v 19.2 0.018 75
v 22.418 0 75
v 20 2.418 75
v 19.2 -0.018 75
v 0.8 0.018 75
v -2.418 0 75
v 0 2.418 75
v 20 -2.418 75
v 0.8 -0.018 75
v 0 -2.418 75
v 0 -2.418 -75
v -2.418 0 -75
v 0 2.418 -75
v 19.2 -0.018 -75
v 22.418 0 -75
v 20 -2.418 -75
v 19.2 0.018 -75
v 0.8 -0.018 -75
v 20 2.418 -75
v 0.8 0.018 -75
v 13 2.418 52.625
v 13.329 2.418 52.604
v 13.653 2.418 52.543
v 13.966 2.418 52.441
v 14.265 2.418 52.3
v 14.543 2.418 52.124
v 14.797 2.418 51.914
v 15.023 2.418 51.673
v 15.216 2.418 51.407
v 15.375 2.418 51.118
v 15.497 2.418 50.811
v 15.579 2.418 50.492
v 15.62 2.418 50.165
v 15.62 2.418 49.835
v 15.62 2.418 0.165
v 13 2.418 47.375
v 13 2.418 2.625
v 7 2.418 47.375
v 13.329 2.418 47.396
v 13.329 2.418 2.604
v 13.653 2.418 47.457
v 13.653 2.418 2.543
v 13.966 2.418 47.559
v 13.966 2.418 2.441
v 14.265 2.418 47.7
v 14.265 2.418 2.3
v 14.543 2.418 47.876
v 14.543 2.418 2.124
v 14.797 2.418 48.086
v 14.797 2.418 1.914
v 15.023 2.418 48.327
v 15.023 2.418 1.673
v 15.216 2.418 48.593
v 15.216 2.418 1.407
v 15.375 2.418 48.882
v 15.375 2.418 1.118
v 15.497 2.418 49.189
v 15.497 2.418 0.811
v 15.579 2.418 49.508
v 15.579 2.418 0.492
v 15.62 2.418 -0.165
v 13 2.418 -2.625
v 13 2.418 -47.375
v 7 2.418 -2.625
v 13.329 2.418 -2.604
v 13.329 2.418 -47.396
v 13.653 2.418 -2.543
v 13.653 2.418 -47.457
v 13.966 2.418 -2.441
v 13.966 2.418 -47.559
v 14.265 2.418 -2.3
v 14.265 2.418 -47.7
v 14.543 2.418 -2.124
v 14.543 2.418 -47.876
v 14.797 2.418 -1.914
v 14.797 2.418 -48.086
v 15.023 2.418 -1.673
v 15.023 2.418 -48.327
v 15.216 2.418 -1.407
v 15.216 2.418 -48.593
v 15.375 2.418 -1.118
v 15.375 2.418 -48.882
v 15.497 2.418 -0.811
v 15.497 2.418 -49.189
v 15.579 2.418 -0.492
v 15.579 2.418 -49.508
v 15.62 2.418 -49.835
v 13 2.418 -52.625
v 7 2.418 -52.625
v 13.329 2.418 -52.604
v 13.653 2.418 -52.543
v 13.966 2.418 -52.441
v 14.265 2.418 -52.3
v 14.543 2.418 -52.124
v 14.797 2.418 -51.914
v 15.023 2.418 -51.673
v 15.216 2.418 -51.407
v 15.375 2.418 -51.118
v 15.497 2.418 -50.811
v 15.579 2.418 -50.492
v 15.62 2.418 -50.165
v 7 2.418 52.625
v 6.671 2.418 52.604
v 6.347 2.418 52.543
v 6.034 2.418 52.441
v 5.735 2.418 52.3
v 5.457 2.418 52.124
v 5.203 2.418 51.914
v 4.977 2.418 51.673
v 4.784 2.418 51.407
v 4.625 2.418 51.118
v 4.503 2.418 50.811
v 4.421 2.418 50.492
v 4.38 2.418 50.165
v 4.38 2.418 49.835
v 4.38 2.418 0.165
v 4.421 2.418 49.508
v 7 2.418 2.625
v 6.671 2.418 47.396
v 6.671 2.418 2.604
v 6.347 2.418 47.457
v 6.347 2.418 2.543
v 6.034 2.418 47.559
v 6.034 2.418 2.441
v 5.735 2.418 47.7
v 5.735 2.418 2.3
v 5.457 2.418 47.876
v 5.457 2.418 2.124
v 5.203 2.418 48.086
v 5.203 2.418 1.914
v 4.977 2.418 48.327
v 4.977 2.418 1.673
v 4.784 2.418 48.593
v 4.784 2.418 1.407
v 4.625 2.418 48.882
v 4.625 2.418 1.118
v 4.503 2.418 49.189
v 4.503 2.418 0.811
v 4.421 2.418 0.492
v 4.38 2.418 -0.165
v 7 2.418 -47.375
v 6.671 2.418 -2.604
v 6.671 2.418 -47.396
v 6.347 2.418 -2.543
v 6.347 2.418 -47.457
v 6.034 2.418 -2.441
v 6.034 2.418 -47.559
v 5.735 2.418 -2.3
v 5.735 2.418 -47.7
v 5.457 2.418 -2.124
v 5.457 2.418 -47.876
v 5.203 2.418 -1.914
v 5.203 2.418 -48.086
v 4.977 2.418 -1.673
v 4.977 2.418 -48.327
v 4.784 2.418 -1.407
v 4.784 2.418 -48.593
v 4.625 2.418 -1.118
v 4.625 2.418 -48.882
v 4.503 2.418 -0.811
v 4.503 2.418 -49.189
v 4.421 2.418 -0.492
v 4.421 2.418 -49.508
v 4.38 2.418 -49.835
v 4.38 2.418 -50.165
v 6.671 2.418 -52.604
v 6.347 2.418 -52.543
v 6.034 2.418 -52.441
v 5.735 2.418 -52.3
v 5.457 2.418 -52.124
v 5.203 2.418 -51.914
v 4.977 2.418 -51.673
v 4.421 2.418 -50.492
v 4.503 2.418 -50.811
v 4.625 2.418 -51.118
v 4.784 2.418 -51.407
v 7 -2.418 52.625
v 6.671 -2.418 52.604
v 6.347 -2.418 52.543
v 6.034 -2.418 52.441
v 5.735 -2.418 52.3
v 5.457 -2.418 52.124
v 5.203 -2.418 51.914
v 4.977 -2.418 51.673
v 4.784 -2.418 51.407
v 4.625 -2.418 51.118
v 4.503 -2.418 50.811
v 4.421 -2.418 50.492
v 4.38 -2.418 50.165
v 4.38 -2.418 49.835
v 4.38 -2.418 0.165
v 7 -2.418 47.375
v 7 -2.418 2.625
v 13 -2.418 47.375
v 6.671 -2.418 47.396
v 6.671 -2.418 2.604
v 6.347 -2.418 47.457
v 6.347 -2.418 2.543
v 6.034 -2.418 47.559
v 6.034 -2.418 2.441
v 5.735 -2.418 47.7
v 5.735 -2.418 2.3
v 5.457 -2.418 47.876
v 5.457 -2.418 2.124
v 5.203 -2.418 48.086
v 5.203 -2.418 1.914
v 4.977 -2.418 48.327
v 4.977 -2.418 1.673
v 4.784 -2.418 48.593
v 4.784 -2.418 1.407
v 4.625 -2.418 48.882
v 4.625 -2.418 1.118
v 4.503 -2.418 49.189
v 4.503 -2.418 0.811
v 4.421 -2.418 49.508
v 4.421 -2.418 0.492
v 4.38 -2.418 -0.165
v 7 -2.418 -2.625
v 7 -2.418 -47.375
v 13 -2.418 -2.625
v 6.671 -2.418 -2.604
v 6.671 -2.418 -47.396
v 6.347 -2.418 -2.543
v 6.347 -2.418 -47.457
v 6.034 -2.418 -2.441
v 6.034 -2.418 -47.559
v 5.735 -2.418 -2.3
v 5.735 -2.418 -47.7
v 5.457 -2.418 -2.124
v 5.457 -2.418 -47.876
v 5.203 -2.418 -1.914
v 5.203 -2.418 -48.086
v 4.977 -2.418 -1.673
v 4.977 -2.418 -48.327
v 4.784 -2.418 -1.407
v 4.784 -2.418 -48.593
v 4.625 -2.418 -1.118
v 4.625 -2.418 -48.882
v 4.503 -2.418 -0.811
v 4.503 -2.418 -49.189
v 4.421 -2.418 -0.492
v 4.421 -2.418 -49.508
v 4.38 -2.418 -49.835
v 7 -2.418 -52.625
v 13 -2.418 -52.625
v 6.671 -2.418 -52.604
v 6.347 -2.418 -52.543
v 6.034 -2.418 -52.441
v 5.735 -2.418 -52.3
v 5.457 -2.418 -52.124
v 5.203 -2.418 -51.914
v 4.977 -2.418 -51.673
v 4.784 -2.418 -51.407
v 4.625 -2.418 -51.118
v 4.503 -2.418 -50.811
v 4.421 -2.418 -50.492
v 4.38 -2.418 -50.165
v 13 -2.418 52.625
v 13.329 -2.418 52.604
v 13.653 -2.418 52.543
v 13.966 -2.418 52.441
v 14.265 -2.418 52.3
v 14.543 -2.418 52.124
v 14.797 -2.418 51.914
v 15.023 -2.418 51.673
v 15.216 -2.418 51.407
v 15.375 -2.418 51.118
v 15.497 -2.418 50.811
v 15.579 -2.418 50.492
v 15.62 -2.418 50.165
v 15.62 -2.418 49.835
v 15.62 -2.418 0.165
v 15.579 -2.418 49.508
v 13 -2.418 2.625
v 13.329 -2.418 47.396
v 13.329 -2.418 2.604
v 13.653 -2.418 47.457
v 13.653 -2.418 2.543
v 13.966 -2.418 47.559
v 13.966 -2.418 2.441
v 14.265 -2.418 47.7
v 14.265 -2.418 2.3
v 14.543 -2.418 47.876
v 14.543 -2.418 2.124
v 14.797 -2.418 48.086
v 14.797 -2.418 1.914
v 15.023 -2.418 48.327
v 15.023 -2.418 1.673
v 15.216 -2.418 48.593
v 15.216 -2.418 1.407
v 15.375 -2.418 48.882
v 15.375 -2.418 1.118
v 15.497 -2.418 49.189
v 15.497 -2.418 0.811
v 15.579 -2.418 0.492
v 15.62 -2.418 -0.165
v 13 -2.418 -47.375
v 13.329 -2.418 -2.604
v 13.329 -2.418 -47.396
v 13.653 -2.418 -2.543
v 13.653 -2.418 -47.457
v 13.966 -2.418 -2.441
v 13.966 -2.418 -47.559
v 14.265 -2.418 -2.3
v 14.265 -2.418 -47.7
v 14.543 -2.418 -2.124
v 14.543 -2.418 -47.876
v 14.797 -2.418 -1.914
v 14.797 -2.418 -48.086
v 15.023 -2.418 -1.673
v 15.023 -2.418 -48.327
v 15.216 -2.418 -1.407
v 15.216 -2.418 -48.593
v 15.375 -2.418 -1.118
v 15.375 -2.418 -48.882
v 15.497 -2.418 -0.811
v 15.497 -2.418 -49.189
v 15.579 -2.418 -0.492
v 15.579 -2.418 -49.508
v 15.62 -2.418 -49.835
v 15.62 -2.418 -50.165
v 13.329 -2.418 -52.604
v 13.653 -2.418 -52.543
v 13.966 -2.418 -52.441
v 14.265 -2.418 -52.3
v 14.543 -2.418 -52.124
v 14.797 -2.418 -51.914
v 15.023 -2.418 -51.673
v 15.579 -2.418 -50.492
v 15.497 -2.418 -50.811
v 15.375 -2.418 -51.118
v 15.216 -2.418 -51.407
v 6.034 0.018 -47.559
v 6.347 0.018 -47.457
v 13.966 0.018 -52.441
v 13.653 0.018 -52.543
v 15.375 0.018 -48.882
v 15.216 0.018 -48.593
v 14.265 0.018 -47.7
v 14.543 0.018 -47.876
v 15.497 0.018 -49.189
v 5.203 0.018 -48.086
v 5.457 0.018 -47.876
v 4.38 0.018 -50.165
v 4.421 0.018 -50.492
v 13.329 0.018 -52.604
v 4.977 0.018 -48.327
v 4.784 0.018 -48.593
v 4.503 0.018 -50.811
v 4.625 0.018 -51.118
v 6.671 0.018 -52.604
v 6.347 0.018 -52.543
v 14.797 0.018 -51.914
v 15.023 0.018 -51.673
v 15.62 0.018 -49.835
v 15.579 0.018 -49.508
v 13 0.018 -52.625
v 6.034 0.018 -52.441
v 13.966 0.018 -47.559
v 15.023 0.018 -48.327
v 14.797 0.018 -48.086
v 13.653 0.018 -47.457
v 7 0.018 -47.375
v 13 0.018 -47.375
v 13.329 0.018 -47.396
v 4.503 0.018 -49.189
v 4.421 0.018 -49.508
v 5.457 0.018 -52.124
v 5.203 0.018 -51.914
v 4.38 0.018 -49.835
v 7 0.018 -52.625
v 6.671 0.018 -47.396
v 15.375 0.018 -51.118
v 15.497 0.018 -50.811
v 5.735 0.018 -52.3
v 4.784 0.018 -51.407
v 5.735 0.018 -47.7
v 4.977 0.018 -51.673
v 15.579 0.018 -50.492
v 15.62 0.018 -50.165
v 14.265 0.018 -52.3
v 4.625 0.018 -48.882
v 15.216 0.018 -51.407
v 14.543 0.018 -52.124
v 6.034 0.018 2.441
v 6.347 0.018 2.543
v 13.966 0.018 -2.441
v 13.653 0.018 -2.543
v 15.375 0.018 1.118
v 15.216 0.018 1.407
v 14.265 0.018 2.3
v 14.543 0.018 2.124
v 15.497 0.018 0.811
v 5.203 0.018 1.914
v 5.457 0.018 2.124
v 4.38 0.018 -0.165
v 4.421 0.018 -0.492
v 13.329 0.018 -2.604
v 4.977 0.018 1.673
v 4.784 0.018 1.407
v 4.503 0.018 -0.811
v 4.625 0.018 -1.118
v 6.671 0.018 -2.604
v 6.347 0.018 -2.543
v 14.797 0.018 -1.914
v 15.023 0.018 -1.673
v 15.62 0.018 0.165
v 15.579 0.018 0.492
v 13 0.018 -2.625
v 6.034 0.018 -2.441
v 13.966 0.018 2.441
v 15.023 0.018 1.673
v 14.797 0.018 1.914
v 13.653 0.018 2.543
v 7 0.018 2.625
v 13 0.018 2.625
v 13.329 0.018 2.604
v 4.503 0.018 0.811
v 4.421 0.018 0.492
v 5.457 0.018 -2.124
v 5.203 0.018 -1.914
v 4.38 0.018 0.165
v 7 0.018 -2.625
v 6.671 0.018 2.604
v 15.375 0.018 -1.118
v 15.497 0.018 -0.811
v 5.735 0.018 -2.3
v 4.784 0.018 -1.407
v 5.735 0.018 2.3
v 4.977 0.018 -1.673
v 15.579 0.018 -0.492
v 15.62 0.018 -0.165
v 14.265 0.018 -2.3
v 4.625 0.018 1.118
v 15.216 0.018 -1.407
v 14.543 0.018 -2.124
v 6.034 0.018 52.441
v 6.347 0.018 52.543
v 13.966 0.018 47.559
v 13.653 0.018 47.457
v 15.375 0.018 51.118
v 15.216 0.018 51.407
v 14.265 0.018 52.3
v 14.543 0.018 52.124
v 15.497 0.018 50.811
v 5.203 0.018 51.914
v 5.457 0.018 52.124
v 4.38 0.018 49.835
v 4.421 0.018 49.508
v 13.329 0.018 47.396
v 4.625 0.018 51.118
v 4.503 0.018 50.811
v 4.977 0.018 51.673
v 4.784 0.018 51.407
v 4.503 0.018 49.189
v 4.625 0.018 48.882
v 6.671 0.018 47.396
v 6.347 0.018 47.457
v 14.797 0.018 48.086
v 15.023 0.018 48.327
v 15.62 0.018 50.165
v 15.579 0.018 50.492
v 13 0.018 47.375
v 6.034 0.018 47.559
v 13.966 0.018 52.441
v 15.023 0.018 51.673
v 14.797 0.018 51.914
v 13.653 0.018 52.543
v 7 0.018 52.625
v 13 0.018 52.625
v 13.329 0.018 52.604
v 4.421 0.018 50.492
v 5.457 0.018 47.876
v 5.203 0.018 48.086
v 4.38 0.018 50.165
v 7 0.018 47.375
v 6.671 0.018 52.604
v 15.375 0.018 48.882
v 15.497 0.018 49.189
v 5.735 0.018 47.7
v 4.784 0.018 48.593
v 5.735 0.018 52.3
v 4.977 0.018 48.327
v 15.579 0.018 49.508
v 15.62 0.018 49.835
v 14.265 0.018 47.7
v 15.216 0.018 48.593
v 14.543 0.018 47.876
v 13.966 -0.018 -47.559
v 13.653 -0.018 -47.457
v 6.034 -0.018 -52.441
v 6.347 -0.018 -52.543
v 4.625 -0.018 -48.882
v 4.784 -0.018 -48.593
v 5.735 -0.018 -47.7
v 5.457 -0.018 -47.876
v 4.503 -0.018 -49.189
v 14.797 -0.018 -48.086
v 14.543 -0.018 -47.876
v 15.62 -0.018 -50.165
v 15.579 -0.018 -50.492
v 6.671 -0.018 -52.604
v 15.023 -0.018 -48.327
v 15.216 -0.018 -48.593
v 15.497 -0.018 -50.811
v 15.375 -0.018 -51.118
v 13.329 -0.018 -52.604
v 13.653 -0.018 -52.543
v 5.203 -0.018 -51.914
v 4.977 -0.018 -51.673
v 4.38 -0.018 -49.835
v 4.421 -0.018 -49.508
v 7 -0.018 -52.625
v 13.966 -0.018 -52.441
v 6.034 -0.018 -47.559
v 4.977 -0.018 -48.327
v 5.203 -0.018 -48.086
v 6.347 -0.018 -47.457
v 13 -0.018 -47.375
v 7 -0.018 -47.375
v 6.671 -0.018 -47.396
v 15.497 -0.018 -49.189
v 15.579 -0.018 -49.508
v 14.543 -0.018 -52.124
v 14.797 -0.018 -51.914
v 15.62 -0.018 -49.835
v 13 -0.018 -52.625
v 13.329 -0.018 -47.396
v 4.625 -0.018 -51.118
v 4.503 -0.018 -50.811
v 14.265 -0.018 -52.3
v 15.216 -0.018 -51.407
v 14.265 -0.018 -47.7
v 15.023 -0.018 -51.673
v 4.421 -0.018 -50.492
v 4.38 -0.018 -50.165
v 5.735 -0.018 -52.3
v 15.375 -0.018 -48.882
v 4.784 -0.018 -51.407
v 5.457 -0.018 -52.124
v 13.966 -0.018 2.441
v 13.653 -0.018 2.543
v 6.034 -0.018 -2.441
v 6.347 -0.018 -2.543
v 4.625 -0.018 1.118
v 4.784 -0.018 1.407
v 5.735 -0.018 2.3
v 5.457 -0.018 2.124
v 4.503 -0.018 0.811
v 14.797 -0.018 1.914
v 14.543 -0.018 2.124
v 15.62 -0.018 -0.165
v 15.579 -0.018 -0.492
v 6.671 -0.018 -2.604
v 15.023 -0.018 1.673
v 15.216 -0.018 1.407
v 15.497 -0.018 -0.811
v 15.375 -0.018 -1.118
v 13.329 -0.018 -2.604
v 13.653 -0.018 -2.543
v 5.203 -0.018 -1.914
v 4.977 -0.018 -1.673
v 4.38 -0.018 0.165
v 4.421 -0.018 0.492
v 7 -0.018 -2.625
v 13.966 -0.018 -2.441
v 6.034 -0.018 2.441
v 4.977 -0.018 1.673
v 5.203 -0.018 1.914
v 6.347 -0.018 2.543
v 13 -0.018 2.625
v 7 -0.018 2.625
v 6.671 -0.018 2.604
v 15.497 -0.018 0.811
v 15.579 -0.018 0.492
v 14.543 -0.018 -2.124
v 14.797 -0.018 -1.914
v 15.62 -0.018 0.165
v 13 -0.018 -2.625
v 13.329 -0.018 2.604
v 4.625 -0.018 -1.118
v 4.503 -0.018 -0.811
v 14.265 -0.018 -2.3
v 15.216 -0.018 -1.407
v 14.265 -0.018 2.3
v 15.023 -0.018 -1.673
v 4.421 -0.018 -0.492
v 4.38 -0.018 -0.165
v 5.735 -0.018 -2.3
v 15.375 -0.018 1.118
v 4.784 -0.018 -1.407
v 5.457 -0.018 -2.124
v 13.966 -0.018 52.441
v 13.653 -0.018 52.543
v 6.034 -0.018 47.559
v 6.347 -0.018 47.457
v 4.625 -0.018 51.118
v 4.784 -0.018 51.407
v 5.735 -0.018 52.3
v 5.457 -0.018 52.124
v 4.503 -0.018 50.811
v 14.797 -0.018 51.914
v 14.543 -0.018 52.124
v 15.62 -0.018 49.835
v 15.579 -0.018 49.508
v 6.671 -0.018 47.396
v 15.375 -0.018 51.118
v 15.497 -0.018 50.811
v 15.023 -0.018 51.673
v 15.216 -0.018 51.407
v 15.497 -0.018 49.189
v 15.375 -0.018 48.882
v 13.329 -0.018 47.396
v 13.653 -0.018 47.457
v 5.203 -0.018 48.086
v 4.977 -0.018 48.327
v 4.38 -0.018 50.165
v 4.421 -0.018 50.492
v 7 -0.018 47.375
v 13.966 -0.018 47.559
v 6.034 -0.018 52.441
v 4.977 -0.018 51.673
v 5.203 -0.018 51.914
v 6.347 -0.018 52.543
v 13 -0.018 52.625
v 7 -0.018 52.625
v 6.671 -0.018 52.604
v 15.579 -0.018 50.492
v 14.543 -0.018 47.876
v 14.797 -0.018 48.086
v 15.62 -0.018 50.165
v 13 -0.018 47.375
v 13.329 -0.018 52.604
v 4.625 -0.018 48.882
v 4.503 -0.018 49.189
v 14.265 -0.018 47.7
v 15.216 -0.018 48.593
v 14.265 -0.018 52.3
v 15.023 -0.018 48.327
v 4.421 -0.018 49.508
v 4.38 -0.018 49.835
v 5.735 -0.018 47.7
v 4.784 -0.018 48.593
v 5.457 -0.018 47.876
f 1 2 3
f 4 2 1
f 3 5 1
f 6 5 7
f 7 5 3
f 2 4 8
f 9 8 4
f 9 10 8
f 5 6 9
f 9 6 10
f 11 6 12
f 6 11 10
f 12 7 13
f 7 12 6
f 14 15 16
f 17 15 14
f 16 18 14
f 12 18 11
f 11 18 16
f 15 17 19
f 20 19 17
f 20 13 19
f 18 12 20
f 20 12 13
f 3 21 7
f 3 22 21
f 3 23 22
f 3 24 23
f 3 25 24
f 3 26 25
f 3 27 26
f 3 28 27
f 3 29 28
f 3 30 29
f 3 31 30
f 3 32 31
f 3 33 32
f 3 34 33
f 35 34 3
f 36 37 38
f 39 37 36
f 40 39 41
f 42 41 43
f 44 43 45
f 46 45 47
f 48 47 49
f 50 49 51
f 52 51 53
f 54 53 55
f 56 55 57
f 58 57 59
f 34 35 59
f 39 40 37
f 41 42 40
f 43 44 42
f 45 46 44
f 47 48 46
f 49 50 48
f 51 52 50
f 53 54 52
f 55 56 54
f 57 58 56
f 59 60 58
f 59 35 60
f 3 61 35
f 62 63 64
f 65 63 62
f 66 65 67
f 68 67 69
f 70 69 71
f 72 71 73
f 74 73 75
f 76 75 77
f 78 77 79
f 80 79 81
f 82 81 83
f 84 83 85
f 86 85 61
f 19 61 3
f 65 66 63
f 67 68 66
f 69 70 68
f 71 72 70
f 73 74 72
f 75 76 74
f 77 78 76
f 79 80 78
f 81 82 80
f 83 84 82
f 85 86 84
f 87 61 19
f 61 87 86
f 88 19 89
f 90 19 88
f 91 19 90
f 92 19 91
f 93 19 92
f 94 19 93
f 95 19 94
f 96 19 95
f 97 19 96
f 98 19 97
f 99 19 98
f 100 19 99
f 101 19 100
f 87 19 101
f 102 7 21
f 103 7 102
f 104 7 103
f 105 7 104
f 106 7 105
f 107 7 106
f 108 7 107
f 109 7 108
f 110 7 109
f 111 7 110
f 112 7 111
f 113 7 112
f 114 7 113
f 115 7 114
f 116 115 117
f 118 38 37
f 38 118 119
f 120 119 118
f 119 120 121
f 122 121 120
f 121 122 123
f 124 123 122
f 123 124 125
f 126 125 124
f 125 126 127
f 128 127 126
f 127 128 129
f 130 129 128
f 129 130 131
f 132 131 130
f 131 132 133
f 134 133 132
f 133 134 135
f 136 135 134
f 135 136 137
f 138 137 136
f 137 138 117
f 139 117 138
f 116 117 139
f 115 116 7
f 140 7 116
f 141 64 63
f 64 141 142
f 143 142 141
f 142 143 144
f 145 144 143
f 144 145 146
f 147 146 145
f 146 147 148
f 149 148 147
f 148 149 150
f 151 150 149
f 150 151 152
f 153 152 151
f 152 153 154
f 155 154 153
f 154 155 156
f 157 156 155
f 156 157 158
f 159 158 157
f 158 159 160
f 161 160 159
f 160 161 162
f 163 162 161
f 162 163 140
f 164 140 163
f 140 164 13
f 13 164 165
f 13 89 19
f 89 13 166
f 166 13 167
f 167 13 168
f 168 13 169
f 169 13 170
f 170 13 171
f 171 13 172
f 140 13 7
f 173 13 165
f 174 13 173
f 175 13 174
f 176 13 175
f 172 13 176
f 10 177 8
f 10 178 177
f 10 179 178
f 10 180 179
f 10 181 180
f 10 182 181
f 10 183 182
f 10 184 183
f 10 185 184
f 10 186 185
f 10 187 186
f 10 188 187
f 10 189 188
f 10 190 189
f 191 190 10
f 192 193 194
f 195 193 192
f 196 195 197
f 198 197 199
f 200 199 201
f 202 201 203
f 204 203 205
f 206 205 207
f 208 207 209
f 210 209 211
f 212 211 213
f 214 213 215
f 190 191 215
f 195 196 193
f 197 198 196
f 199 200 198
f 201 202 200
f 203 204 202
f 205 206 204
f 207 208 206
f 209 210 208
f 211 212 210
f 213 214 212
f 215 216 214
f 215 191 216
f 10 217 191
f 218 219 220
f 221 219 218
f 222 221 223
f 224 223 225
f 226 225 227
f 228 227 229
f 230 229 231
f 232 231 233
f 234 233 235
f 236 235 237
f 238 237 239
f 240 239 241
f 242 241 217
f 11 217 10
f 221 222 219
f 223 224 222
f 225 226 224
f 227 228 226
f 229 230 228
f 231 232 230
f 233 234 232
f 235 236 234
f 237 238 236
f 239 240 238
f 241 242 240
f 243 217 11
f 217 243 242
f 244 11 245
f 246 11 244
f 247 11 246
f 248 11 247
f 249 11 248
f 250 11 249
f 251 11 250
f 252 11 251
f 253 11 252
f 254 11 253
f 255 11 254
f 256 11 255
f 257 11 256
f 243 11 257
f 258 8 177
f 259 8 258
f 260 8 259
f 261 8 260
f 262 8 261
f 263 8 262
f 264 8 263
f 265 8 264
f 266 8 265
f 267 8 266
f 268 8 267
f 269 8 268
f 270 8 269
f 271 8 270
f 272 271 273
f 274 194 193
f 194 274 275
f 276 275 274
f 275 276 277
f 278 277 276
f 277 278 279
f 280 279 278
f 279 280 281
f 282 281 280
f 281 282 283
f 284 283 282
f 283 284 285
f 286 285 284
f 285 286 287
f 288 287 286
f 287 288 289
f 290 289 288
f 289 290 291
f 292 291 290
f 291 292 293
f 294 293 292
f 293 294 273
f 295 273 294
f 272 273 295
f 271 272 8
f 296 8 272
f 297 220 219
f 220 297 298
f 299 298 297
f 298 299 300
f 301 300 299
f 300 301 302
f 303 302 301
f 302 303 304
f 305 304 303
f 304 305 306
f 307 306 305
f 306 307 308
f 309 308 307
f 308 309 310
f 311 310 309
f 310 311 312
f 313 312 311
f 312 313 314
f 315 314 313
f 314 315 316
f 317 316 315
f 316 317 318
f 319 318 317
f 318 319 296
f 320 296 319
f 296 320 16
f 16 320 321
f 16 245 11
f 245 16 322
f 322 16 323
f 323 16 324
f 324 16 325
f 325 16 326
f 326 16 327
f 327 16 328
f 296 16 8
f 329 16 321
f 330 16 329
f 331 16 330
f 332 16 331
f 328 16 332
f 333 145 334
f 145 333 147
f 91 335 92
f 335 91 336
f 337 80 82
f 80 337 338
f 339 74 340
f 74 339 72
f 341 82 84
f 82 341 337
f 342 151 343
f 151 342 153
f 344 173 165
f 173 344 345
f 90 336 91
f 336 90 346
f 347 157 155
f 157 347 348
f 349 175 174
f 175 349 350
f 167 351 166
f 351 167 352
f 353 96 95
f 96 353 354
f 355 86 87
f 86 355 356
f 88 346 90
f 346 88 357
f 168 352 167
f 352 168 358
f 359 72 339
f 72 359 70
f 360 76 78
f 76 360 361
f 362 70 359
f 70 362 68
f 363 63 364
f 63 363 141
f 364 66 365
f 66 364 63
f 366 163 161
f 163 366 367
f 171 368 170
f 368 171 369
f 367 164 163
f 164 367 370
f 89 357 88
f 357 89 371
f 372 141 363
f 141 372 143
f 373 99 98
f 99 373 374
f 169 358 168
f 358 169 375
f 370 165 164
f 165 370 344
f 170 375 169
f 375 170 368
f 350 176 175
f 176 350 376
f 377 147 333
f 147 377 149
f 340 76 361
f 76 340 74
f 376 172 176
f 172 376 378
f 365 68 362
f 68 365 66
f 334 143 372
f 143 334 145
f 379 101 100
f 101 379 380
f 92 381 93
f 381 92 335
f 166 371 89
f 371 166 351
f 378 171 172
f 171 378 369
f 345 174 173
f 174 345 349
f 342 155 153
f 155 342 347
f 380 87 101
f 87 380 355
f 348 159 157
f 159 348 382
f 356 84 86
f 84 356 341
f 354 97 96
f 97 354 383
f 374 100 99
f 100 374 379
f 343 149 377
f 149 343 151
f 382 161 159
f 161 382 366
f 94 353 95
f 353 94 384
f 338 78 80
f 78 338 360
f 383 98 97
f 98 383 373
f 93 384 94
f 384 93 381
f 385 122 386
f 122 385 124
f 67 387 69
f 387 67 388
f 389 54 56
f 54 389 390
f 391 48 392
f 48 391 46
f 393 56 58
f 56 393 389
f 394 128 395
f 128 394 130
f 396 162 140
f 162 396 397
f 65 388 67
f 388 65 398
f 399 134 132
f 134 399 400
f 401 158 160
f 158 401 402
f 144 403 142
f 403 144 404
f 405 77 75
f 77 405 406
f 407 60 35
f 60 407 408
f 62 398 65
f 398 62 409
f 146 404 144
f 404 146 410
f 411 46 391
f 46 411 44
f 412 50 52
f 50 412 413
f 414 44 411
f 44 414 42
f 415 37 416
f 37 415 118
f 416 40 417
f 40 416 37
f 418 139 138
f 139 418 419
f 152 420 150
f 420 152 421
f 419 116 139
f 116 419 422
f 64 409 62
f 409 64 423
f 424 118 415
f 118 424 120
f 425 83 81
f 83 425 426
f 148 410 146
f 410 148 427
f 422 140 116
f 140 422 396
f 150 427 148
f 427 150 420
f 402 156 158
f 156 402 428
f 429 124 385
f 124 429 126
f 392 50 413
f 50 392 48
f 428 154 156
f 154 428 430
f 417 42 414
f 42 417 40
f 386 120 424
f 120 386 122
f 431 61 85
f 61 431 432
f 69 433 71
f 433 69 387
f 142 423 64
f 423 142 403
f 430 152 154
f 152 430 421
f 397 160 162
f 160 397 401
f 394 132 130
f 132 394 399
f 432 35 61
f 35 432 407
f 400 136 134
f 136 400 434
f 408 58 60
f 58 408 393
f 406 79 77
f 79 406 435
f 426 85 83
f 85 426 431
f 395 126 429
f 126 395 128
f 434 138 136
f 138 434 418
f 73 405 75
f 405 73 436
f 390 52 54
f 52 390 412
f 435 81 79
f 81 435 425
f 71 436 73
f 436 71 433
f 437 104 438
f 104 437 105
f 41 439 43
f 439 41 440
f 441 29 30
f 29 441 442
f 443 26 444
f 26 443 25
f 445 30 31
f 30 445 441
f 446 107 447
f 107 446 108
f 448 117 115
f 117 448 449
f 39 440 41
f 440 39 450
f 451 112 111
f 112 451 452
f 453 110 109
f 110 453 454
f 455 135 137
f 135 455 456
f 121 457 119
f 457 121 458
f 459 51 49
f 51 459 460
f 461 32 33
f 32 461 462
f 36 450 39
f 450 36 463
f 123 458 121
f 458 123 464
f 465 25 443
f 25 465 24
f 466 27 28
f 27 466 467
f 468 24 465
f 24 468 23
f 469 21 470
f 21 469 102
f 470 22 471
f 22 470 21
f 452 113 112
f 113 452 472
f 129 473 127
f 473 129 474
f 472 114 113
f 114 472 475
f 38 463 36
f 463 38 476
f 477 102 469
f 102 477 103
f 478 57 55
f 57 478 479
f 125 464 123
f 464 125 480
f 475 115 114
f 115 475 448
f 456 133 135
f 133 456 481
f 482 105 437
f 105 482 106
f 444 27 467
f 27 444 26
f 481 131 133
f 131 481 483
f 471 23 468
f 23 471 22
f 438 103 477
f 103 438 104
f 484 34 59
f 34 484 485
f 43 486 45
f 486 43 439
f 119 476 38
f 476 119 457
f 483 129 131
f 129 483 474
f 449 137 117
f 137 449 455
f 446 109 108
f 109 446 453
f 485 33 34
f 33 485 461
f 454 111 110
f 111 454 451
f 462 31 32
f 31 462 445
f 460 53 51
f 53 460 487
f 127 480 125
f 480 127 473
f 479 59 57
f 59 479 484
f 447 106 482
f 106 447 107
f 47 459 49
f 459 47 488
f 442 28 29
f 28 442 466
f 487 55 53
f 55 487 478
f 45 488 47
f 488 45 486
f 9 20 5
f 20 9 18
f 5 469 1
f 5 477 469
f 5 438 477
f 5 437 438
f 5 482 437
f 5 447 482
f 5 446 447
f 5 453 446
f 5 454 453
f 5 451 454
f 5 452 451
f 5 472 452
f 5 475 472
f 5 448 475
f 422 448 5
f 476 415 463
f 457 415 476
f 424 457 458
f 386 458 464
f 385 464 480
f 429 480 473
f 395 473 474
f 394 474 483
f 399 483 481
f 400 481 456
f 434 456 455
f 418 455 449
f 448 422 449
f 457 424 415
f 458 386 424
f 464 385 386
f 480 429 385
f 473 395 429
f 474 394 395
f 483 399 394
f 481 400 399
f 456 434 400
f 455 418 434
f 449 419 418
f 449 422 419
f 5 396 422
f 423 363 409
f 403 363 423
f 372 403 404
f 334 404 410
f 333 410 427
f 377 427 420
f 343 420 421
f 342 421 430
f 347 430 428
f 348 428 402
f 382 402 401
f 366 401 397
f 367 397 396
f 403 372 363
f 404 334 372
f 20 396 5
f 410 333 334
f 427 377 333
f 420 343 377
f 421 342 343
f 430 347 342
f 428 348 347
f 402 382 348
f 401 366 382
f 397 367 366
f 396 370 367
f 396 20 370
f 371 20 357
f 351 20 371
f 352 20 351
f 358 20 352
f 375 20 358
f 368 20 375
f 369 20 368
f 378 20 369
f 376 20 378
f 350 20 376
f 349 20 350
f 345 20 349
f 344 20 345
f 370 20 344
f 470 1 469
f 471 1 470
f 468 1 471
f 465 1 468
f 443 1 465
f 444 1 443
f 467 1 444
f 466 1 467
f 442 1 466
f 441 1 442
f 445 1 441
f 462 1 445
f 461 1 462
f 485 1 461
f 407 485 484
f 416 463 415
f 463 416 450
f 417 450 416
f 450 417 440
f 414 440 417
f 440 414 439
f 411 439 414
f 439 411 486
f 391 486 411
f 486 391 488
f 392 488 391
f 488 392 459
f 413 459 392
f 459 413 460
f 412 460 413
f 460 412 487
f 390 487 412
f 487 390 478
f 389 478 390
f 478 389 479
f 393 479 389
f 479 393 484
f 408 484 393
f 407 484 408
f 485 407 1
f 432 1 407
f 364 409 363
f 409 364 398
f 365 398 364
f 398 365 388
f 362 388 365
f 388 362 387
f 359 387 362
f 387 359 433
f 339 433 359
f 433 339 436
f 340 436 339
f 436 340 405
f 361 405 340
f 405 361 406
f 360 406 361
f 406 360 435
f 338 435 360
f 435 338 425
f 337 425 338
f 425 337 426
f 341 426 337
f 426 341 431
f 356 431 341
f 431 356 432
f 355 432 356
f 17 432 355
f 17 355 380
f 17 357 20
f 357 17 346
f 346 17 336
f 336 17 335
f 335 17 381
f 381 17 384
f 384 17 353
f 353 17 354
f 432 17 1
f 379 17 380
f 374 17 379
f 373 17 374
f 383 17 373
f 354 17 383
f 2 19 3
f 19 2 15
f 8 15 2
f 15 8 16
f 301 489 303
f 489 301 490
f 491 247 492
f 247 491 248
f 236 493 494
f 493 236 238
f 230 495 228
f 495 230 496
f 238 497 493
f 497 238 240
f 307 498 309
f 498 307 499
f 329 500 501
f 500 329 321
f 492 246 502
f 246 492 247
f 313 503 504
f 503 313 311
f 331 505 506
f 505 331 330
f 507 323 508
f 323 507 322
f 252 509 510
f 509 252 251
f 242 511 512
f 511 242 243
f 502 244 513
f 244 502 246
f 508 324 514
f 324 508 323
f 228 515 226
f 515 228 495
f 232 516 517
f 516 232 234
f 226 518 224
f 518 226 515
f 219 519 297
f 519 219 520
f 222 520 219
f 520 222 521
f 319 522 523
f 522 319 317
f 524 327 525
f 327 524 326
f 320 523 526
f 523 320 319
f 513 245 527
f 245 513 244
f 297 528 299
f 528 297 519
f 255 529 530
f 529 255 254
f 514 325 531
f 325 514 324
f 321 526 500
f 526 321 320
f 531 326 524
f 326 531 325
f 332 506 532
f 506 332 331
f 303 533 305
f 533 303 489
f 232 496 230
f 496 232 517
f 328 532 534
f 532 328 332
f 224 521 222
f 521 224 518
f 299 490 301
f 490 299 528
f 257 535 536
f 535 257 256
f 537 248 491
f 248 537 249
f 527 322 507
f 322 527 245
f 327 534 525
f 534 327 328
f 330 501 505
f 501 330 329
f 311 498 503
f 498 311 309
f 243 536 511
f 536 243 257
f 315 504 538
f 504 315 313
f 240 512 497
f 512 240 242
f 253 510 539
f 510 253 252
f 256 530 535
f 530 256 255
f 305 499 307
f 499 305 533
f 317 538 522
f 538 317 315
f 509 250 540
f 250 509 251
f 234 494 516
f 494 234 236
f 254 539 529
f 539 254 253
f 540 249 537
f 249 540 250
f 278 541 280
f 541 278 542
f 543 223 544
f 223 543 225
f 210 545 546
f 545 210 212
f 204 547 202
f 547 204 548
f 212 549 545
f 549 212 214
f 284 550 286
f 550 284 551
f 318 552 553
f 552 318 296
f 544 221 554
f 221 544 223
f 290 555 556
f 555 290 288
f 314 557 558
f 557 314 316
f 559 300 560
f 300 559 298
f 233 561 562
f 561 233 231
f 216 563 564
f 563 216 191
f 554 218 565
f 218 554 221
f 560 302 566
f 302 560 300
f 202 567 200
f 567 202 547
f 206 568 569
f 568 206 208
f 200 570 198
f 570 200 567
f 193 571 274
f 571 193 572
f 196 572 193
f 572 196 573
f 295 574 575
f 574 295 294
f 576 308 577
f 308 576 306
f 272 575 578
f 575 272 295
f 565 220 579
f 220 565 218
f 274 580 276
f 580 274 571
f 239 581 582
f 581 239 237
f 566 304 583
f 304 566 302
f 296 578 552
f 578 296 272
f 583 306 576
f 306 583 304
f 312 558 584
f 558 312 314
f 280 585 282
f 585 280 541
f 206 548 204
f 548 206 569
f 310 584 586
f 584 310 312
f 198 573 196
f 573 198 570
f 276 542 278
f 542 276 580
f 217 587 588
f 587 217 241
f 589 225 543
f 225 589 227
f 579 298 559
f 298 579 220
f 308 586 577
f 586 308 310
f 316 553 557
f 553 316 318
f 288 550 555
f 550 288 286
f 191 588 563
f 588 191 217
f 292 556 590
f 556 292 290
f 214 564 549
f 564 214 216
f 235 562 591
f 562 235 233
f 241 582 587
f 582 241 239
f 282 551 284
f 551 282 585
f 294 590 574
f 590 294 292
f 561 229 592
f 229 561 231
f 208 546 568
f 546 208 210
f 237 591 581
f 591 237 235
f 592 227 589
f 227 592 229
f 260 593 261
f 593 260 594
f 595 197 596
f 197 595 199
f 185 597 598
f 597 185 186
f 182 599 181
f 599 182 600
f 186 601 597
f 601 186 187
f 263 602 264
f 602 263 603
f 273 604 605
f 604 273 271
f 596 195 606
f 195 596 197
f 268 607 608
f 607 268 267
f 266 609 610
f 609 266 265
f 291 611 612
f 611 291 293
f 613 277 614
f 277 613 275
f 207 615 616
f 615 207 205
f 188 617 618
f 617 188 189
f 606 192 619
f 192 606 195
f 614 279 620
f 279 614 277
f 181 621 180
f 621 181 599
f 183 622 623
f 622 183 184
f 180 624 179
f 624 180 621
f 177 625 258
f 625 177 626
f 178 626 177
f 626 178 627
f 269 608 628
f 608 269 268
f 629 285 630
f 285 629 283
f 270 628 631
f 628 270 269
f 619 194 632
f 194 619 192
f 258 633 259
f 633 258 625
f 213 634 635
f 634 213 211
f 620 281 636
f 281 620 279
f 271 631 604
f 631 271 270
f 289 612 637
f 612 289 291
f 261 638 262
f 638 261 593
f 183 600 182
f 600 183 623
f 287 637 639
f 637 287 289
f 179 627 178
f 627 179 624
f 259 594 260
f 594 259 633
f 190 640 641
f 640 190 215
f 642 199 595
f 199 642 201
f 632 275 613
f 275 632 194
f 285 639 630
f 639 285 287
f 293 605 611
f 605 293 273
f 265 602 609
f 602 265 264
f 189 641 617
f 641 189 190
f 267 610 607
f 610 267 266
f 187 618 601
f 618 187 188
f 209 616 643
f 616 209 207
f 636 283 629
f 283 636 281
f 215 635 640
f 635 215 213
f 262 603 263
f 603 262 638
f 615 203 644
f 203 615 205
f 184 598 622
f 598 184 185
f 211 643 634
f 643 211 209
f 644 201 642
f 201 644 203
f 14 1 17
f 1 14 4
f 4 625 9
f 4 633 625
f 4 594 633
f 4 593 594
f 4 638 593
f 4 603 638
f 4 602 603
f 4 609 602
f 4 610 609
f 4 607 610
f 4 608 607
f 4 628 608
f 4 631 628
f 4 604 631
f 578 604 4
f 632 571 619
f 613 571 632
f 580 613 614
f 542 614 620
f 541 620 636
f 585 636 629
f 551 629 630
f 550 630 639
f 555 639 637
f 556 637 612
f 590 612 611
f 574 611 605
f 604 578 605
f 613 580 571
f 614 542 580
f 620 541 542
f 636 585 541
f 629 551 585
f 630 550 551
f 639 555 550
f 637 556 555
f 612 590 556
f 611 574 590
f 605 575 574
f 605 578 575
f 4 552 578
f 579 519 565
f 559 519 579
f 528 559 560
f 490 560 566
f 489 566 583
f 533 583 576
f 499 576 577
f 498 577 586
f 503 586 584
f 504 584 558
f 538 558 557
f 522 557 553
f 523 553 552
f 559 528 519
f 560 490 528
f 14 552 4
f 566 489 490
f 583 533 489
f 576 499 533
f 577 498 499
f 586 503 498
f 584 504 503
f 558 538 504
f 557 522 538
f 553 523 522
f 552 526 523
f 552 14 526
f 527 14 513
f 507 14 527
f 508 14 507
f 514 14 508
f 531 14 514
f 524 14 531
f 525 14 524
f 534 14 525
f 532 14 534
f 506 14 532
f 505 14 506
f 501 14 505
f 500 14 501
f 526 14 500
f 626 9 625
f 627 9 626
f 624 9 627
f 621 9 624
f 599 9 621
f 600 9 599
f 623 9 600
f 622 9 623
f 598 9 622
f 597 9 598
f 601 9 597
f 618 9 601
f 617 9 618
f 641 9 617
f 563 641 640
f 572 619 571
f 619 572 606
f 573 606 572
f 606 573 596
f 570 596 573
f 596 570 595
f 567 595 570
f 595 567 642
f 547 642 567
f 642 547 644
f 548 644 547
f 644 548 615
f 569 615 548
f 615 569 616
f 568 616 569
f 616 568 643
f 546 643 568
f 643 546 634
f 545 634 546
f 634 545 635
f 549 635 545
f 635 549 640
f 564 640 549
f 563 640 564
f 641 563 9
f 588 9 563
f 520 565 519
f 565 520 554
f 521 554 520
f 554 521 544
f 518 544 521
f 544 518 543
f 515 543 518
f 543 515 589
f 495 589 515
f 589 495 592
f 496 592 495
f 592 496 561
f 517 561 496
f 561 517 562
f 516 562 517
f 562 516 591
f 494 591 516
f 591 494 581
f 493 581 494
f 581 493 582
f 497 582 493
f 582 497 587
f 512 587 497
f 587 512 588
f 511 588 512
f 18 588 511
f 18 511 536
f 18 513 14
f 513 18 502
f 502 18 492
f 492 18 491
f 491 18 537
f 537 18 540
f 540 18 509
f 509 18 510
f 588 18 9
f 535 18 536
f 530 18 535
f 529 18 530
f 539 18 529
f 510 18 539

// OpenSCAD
// OpenRail rail
// drawn by jdausilio/zeke7237
// I had to do this one from measurements, and assume that the wheel profile is the same as the rail

$fn=50;

side=3.42;		// from wheel drawing
width=20;		// width not including point
overhang=0.8;	// rectangle below point
thickness=2.4;	// thickness of skinny part
hypotenuse=side*sqrt(2);
hole_spacing=50;
hole_width=5.25;
hole_height=12;

module oval_hole() {
	minkowski() {
		cylinder(r=2.625,h=thickness+5,center=true);
		cube([0.00001,hole_height/2,thickness+5],center=true);
	}
}

module rail(length) {
	difference() {
		union() {
			rotate([0,0,45])cube([side,side,length],center=true);
			translate([width/2,0,0])cube([width,hypotenuse,length],center=true);
		}
		translate([(width-overhang)/2+overhang+0.1,-thickness/2-0.1,0])
			cube([width-overhang+0.2,hypotenuse-thickness+0.2,length+0.1],center=true);
		for(i=[-floor(length/(2*hole_spacing)):1:floor(length/(2*hole_spacing))]) {
			translate([width/2,thickness/2+0,i*50])rotate([0,90,90])oval_hole();
		}
	}
}

module double_rail(length) {
	rail(length);
	translate([20,0,0])rotate([0,0,180])rail(length);
}

double_rail(150);
